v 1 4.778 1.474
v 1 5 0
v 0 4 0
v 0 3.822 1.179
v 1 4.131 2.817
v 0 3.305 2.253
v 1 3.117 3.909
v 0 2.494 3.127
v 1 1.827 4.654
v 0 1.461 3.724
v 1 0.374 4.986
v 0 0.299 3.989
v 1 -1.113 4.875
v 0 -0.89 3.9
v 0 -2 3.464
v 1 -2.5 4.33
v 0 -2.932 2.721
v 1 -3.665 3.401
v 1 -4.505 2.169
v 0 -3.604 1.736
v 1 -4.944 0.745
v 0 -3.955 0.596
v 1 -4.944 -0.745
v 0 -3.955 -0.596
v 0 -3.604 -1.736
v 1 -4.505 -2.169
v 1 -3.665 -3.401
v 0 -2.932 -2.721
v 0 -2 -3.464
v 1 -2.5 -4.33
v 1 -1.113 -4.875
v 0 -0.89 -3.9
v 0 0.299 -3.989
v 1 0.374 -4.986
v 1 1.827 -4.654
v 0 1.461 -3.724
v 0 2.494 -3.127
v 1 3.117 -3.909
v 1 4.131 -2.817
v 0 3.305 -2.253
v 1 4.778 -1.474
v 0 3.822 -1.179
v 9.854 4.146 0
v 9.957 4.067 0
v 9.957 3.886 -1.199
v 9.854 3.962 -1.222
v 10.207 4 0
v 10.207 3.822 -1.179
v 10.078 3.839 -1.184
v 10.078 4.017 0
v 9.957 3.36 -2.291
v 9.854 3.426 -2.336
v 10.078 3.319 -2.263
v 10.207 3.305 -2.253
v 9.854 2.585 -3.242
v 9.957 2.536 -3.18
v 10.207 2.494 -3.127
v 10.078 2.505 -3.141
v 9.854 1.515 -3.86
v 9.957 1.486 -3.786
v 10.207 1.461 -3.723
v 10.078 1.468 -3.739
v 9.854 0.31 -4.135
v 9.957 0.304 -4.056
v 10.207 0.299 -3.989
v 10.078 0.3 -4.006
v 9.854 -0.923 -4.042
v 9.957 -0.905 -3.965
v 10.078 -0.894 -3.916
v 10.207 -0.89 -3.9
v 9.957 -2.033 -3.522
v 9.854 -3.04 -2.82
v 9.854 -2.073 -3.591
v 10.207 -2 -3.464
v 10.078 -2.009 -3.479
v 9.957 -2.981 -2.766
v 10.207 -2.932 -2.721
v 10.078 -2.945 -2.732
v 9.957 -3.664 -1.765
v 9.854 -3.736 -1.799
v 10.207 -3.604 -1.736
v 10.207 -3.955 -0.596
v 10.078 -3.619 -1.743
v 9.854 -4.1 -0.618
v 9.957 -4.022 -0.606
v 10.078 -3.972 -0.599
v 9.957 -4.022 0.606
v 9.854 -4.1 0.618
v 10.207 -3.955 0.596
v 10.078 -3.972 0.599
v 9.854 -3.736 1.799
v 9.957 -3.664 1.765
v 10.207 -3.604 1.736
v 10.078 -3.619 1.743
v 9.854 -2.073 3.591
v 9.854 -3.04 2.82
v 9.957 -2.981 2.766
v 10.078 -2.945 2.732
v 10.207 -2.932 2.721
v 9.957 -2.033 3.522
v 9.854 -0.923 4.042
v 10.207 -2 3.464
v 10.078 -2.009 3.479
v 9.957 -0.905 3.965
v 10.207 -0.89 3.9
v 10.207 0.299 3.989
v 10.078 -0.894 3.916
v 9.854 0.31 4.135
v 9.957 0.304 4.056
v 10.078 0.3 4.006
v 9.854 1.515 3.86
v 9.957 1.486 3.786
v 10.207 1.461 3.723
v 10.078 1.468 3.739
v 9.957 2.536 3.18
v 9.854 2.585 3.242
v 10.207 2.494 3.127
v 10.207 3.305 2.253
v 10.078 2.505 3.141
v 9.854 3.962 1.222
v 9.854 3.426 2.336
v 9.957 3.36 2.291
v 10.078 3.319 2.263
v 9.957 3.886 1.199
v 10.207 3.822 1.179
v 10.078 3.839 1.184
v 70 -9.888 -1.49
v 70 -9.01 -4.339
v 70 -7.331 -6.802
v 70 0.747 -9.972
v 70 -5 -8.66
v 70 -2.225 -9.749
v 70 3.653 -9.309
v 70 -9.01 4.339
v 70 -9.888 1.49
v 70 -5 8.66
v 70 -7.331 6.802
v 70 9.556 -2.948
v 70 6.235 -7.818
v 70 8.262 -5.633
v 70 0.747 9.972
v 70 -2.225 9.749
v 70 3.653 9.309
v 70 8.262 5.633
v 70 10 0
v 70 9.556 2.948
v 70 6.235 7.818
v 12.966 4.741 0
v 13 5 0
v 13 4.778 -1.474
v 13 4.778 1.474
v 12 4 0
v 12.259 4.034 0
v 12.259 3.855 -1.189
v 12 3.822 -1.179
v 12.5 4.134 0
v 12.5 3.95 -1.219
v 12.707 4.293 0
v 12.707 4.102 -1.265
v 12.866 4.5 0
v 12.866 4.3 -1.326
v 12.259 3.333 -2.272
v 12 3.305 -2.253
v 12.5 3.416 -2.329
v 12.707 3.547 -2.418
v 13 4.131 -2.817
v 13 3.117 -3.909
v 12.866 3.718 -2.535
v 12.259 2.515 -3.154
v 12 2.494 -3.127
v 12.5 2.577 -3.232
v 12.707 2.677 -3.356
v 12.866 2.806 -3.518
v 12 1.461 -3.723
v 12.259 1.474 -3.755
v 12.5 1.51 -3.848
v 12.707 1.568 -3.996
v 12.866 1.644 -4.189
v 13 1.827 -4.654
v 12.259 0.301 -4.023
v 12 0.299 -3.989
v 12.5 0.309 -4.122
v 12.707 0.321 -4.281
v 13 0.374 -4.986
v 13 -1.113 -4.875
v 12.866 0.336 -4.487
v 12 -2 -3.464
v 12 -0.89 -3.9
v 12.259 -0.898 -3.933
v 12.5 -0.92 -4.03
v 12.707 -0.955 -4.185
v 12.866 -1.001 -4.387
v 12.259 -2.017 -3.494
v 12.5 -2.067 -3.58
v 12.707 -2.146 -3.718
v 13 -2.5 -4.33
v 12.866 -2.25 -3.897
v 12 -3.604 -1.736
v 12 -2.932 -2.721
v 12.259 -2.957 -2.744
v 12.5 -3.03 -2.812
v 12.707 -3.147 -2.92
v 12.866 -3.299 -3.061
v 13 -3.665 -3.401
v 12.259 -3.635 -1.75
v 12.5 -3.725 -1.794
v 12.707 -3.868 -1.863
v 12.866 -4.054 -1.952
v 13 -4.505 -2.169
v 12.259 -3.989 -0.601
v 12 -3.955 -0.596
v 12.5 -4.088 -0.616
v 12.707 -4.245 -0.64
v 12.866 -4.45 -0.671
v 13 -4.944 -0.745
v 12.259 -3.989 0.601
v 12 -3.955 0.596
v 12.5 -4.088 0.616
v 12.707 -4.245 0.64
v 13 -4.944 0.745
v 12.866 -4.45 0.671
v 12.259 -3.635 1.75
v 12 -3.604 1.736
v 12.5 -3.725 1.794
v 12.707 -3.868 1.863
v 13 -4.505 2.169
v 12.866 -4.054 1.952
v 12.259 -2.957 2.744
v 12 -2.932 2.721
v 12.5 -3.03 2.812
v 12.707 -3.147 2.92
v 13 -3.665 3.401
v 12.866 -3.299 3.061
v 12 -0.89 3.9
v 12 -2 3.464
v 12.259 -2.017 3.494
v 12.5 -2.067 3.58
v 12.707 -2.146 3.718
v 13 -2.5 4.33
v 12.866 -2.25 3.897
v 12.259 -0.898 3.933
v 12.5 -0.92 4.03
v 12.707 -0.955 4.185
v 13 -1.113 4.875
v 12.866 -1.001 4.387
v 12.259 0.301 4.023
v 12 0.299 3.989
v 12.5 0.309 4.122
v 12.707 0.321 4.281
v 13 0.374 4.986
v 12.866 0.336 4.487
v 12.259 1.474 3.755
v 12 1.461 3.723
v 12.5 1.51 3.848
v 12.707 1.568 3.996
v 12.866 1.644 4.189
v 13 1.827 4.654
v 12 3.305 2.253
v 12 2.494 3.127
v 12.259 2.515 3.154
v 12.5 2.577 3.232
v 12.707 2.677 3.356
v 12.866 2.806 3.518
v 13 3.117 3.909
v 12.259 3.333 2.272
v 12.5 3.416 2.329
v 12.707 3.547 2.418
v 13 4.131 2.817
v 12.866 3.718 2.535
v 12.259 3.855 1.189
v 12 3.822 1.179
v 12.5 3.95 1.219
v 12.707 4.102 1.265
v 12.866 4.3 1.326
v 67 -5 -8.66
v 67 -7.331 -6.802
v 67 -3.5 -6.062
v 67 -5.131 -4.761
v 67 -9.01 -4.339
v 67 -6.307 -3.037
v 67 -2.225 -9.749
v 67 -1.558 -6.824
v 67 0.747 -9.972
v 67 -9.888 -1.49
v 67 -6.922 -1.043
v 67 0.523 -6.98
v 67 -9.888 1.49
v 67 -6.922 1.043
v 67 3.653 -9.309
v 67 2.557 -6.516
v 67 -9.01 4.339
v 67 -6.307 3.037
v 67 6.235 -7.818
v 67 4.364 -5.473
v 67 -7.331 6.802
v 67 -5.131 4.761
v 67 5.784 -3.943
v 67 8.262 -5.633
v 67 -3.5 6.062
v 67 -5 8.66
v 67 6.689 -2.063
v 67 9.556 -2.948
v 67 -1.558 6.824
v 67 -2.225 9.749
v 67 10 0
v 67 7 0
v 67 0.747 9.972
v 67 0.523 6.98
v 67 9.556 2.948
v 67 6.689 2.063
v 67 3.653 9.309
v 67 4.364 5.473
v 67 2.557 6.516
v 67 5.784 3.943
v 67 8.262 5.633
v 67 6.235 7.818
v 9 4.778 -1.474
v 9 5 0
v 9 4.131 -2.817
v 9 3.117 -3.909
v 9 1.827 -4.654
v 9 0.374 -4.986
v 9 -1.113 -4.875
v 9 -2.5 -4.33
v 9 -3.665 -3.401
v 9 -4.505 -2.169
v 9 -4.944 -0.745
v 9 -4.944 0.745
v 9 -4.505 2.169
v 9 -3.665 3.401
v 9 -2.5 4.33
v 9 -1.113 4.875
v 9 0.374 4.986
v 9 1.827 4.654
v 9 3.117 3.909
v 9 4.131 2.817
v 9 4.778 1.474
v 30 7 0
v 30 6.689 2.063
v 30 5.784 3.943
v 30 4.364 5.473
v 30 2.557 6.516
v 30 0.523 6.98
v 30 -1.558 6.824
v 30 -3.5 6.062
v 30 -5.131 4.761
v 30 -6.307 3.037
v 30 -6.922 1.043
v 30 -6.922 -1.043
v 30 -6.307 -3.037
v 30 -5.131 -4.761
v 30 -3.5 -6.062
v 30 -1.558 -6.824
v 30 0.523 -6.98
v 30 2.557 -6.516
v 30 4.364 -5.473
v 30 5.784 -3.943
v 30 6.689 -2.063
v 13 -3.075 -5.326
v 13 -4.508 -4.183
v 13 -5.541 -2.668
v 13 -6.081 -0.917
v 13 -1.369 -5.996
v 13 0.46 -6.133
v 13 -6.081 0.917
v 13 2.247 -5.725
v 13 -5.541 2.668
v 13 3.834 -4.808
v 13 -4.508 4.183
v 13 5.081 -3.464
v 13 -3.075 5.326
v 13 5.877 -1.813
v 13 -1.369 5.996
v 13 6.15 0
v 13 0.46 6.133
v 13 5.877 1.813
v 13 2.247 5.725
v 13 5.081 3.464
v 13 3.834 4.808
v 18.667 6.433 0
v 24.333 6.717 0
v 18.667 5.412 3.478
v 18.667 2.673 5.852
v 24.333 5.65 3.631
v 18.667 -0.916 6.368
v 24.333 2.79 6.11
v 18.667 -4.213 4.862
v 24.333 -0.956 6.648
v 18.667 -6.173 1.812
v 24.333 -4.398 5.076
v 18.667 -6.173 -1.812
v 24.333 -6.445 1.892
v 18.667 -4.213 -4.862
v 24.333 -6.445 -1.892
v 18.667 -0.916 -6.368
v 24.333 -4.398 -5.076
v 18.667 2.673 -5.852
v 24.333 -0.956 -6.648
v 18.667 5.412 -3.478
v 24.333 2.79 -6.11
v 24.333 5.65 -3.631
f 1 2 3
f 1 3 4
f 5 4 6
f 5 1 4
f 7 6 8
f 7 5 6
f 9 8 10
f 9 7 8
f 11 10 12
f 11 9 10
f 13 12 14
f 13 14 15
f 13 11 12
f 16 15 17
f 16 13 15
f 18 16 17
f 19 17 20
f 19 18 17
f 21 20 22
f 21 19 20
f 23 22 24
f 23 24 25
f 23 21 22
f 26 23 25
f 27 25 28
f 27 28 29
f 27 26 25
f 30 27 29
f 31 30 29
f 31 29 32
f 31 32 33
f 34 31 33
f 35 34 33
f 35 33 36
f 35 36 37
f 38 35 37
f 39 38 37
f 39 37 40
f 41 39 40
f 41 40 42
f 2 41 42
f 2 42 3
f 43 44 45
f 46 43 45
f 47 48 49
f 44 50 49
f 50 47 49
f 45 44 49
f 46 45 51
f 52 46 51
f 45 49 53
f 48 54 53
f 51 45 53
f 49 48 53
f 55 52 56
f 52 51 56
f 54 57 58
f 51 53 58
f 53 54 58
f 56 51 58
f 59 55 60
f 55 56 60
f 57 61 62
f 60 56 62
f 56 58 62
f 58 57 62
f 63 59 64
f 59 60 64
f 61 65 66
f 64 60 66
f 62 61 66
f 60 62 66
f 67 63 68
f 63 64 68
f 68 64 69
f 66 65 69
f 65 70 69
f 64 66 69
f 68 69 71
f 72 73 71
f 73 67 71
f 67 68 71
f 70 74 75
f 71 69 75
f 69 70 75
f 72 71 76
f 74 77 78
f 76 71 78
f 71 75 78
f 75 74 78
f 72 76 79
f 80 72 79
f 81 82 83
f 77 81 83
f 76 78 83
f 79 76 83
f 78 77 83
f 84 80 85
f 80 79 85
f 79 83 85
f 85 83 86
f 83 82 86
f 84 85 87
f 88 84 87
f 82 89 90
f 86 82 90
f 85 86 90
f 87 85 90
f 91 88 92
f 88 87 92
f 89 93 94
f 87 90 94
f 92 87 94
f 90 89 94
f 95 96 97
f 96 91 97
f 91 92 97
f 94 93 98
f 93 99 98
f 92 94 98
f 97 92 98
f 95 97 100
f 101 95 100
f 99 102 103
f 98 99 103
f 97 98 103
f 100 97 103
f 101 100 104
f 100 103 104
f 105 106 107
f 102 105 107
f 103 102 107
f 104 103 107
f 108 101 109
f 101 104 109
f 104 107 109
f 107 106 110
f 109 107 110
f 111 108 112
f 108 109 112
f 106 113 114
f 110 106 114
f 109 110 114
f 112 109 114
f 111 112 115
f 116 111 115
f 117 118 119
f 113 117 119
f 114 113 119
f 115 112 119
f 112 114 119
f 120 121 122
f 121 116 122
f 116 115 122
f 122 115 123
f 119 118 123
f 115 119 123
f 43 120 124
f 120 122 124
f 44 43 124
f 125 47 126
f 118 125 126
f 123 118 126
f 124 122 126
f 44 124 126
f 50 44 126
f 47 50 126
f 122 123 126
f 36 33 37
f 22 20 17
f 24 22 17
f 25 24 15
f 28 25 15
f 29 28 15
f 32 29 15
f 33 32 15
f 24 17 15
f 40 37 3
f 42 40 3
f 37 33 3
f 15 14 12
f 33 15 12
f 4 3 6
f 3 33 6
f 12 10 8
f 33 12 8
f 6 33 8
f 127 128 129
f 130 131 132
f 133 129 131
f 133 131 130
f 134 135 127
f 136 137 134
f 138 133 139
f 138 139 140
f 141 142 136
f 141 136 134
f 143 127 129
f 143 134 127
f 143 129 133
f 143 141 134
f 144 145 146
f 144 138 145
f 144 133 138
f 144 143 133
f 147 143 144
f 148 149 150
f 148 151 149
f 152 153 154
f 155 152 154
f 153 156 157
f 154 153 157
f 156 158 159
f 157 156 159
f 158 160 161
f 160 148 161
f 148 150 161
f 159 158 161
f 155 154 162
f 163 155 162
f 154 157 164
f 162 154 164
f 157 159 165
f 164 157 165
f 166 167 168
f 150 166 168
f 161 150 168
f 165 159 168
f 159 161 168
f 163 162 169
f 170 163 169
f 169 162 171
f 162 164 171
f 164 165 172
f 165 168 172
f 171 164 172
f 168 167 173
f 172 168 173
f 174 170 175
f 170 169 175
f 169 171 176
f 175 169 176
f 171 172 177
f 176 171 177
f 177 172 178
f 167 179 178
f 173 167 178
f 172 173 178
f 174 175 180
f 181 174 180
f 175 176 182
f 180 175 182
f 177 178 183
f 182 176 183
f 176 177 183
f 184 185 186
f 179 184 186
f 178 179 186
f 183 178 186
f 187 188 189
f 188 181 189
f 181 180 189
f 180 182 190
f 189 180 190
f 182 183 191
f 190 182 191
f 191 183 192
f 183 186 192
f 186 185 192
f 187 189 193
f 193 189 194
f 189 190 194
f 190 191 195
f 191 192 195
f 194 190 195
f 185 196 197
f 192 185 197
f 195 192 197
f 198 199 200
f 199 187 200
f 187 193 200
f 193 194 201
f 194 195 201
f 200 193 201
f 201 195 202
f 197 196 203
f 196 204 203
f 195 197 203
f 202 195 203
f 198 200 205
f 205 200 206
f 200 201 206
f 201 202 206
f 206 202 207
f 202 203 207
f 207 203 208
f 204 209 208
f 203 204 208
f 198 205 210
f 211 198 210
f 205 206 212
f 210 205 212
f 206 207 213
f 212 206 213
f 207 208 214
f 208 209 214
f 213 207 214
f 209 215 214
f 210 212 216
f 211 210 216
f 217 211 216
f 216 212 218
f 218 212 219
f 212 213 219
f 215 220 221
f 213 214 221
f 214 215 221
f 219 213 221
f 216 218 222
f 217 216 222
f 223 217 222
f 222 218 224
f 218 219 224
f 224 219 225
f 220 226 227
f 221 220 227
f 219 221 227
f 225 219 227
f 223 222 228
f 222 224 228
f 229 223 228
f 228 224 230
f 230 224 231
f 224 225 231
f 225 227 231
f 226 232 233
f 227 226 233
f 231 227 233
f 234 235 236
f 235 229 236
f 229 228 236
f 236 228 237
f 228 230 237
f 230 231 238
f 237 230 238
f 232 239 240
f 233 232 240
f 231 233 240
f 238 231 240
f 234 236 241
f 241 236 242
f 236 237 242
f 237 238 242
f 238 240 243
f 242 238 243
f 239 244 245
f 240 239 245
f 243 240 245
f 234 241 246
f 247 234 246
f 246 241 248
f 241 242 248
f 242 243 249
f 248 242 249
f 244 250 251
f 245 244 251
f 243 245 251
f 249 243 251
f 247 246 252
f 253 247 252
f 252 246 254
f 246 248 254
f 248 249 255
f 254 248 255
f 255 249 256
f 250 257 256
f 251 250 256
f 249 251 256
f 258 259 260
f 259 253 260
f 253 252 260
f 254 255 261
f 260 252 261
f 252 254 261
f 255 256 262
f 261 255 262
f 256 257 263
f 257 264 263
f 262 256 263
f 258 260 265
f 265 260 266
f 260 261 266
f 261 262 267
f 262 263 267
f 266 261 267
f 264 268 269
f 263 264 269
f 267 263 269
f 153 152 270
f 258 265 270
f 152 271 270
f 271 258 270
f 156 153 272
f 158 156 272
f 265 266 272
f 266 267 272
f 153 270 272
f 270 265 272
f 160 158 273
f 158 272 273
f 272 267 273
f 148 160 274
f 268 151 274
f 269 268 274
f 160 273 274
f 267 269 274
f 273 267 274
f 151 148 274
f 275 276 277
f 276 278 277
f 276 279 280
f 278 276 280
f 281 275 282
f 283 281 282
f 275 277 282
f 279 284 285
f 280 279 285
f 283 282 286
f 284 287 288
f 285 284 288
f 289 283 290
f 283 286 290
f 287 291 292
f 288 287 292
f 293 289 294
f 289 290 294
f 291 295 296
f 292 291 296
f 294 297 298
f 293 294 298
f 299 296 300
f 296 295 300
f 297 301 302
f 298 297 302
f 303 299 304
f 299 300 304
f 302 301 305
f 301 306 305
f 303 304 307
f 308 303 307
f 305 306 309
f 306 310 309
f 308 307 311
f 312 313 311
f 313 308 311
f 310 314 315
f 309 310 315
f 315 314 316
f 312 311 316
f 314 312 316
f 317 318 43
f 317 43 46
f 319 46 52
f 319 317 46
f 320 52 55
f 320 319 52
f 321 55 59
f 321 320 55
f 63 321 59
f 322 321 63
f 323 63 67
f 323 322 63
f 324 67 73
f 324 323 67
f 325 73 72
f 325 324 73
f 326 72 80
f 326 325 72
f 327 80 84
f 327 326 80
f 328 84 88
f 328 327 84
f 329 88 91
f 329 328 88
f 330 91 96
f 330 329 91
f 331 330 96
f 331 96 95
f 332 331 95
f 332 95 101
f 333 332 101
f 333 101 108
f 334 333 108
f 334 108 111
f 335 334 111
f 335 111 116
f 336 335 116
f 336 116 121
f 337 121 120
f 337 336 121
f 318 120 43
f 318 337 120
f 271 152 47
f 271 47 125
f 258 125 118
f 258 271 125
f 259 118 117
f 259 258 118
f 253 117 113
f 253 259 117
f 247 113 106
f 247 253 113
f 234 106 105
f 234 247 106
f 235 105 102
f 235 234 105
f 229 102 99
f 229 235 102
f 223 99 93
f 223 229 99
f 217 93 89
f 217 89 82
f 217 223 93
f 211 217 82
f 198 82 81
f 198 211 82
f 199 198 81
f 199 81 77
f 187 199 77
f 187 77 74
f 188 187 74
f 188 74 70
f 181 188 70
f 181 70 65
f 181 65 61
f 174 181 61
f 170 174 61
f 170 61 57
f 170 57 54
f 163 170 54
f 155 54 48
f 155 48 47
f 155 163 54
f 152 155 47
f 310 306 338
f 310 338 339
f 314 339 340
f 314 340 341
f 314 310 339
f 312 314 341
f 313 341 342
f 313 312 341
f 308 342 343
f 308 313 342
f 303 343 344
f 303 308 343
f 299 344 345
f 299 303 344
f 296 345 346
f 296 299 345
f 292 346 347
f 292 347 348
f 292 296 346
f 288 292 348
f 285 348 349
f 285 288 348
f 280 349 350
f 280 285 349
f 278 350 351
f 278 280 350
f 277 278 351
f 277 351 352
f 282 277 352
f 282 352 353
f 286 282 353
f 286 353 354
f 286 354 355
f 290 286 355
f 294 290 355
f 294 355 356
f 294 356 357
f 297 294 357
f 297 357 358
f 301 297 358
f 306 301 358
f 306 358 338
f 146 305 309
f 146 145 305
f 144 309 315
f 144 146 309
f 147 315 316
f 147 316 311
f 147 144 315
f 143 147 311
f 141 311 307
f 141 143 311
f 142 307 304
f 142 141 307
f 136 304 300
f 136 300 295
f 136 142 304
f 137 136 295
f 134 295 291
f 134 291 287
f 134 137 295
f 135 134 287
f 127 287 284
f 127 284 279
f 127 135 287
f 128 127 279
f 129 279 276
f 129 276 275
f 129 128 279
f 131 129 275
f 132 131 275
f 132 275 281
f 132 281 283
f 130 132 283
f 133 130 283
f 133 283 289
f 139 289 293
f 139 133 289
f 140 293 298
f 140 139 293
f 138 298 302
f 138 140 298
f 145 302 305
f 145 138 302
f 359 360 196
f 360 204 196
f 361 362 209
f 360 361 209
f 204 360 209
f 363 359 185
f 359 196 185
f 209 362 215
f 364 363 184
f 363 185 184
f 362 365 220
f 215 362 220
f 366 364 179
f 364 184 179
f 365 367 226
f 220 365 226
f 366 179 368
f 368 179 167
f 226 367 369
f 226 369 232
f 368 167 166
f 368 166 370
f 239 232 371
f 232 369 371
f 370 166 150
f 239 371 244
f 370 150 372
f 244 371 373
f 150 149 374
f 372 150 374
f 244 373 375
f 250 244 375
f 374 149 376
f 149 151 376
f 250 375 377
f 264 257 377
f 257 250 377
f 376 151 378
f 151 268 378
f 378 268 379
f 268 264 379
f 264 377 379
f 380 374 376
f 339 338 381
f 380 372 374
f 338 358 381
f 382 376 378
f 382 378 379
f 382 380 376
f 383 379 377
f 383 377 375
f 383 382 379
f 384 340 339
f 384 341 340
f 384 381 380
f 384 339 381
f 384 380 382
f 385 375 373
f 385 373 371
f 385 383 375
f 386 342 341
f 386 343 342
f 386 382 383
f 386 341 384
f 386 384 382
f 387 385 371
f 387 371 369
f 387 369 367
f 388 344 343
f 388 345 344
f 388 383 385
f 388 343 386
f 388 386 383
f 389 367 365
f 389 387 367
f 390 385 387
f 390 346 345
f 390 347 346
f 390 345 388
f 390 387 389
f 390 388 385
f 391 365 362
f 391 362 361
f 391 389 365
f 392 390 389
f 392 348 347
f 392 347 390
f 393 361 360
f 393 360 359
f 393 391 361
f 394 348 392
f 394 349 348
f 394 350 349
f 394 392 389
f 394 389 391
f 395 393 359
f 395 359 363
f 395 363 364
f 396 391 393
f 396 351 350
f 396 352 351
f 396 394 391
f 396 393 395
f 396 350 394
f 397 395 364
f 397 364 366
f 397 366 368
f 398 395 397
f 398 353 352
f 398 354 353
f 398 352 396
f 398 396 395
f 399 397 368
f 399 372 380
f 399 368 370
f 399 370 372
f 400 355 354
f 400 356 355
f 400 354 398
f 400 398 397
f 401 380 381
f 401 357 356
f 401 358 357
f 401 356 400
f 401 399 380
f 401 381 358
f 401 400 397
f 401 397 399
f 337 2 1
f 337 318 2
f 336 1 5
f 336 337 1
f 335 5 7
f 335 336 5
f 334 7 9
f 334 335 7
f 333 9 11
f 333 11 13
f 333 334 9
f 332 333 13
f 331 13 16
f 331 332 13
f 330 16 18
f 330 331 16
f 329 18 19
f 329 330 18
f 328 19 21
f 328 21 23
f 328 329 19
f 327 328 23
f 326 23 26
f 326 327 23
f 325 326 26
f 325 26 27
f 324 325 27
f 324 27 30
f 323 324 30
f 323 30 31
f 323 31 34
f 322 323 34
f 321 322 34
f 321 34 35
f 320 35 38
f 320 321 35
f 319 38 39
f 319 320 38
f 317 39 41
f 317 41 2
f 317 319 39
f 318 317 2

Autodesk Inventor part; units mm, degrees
ref_plane "YZ Plane" through (0, 0, 0) normal (1, 0, 0) x (0, 1, 0)
ref_plane "XZ Plane" through (0, 0, 0) normal (0, 1, 0) x (-1, 0, 0)
ref_plane "XY Plane" through (0, 0, 0) normal (0, 0, 1) x (1, 0, 0)
sketch "Эскиз1" plane through (0, 0, 0) normal (0, 0, 1) x (1, 0, 0)
  line L0 (0, 0) -> (0, 5)
  line L1 (0, 5) -> (10, 5)
  line L2 (10, 5) -> (10, 4)
  line L3 (10, 4) -> (13, 4)
  line L4 (13, 4) -> (13, 6.15)
  line L5 (13, 6.15) -> (30, 7)
  line L6 (30, 7) -> (67, 7)
  line L7 (67, 7) -> (67, 10)
  line L8 (67, 10) -> (70, 10)
  line L9 (70, 10) -> (70, 0)
  line L10 (0, 0) -> (70, 0)
  dimension "d0" = 10
  dimension "d1" = 12.3
  dimension "d2" = 14
  dimension "d3" = 10
  dimension "d4" = 3
  dimension "d5" = 20
  dimension "d6" = 8
  dimension "d7" = 60
  dimension "d8" = 3
  dimension "d9" = 20
revolve "Вращение1" add sketch "Эскиз1" angle 360 about axis through (0, 0, 0) along (1, 0, 0)
thread "Резьба1" size "M10x1.5" class "6g" standard "ISO Metric profile" length 18
chamfer "Фаска1" distance 1 angle 45 2 edges at (0, -5, 0) (10, -5, 0)
fillet "Сопряжение1" radius 0.5 2 edges at (10, -4.0001, 0) (10, -4, 0)
fillet "Сопряжение2" radius 1 1 edges at (13, -4, 0)
properties part number "Палец_ребрышко"
